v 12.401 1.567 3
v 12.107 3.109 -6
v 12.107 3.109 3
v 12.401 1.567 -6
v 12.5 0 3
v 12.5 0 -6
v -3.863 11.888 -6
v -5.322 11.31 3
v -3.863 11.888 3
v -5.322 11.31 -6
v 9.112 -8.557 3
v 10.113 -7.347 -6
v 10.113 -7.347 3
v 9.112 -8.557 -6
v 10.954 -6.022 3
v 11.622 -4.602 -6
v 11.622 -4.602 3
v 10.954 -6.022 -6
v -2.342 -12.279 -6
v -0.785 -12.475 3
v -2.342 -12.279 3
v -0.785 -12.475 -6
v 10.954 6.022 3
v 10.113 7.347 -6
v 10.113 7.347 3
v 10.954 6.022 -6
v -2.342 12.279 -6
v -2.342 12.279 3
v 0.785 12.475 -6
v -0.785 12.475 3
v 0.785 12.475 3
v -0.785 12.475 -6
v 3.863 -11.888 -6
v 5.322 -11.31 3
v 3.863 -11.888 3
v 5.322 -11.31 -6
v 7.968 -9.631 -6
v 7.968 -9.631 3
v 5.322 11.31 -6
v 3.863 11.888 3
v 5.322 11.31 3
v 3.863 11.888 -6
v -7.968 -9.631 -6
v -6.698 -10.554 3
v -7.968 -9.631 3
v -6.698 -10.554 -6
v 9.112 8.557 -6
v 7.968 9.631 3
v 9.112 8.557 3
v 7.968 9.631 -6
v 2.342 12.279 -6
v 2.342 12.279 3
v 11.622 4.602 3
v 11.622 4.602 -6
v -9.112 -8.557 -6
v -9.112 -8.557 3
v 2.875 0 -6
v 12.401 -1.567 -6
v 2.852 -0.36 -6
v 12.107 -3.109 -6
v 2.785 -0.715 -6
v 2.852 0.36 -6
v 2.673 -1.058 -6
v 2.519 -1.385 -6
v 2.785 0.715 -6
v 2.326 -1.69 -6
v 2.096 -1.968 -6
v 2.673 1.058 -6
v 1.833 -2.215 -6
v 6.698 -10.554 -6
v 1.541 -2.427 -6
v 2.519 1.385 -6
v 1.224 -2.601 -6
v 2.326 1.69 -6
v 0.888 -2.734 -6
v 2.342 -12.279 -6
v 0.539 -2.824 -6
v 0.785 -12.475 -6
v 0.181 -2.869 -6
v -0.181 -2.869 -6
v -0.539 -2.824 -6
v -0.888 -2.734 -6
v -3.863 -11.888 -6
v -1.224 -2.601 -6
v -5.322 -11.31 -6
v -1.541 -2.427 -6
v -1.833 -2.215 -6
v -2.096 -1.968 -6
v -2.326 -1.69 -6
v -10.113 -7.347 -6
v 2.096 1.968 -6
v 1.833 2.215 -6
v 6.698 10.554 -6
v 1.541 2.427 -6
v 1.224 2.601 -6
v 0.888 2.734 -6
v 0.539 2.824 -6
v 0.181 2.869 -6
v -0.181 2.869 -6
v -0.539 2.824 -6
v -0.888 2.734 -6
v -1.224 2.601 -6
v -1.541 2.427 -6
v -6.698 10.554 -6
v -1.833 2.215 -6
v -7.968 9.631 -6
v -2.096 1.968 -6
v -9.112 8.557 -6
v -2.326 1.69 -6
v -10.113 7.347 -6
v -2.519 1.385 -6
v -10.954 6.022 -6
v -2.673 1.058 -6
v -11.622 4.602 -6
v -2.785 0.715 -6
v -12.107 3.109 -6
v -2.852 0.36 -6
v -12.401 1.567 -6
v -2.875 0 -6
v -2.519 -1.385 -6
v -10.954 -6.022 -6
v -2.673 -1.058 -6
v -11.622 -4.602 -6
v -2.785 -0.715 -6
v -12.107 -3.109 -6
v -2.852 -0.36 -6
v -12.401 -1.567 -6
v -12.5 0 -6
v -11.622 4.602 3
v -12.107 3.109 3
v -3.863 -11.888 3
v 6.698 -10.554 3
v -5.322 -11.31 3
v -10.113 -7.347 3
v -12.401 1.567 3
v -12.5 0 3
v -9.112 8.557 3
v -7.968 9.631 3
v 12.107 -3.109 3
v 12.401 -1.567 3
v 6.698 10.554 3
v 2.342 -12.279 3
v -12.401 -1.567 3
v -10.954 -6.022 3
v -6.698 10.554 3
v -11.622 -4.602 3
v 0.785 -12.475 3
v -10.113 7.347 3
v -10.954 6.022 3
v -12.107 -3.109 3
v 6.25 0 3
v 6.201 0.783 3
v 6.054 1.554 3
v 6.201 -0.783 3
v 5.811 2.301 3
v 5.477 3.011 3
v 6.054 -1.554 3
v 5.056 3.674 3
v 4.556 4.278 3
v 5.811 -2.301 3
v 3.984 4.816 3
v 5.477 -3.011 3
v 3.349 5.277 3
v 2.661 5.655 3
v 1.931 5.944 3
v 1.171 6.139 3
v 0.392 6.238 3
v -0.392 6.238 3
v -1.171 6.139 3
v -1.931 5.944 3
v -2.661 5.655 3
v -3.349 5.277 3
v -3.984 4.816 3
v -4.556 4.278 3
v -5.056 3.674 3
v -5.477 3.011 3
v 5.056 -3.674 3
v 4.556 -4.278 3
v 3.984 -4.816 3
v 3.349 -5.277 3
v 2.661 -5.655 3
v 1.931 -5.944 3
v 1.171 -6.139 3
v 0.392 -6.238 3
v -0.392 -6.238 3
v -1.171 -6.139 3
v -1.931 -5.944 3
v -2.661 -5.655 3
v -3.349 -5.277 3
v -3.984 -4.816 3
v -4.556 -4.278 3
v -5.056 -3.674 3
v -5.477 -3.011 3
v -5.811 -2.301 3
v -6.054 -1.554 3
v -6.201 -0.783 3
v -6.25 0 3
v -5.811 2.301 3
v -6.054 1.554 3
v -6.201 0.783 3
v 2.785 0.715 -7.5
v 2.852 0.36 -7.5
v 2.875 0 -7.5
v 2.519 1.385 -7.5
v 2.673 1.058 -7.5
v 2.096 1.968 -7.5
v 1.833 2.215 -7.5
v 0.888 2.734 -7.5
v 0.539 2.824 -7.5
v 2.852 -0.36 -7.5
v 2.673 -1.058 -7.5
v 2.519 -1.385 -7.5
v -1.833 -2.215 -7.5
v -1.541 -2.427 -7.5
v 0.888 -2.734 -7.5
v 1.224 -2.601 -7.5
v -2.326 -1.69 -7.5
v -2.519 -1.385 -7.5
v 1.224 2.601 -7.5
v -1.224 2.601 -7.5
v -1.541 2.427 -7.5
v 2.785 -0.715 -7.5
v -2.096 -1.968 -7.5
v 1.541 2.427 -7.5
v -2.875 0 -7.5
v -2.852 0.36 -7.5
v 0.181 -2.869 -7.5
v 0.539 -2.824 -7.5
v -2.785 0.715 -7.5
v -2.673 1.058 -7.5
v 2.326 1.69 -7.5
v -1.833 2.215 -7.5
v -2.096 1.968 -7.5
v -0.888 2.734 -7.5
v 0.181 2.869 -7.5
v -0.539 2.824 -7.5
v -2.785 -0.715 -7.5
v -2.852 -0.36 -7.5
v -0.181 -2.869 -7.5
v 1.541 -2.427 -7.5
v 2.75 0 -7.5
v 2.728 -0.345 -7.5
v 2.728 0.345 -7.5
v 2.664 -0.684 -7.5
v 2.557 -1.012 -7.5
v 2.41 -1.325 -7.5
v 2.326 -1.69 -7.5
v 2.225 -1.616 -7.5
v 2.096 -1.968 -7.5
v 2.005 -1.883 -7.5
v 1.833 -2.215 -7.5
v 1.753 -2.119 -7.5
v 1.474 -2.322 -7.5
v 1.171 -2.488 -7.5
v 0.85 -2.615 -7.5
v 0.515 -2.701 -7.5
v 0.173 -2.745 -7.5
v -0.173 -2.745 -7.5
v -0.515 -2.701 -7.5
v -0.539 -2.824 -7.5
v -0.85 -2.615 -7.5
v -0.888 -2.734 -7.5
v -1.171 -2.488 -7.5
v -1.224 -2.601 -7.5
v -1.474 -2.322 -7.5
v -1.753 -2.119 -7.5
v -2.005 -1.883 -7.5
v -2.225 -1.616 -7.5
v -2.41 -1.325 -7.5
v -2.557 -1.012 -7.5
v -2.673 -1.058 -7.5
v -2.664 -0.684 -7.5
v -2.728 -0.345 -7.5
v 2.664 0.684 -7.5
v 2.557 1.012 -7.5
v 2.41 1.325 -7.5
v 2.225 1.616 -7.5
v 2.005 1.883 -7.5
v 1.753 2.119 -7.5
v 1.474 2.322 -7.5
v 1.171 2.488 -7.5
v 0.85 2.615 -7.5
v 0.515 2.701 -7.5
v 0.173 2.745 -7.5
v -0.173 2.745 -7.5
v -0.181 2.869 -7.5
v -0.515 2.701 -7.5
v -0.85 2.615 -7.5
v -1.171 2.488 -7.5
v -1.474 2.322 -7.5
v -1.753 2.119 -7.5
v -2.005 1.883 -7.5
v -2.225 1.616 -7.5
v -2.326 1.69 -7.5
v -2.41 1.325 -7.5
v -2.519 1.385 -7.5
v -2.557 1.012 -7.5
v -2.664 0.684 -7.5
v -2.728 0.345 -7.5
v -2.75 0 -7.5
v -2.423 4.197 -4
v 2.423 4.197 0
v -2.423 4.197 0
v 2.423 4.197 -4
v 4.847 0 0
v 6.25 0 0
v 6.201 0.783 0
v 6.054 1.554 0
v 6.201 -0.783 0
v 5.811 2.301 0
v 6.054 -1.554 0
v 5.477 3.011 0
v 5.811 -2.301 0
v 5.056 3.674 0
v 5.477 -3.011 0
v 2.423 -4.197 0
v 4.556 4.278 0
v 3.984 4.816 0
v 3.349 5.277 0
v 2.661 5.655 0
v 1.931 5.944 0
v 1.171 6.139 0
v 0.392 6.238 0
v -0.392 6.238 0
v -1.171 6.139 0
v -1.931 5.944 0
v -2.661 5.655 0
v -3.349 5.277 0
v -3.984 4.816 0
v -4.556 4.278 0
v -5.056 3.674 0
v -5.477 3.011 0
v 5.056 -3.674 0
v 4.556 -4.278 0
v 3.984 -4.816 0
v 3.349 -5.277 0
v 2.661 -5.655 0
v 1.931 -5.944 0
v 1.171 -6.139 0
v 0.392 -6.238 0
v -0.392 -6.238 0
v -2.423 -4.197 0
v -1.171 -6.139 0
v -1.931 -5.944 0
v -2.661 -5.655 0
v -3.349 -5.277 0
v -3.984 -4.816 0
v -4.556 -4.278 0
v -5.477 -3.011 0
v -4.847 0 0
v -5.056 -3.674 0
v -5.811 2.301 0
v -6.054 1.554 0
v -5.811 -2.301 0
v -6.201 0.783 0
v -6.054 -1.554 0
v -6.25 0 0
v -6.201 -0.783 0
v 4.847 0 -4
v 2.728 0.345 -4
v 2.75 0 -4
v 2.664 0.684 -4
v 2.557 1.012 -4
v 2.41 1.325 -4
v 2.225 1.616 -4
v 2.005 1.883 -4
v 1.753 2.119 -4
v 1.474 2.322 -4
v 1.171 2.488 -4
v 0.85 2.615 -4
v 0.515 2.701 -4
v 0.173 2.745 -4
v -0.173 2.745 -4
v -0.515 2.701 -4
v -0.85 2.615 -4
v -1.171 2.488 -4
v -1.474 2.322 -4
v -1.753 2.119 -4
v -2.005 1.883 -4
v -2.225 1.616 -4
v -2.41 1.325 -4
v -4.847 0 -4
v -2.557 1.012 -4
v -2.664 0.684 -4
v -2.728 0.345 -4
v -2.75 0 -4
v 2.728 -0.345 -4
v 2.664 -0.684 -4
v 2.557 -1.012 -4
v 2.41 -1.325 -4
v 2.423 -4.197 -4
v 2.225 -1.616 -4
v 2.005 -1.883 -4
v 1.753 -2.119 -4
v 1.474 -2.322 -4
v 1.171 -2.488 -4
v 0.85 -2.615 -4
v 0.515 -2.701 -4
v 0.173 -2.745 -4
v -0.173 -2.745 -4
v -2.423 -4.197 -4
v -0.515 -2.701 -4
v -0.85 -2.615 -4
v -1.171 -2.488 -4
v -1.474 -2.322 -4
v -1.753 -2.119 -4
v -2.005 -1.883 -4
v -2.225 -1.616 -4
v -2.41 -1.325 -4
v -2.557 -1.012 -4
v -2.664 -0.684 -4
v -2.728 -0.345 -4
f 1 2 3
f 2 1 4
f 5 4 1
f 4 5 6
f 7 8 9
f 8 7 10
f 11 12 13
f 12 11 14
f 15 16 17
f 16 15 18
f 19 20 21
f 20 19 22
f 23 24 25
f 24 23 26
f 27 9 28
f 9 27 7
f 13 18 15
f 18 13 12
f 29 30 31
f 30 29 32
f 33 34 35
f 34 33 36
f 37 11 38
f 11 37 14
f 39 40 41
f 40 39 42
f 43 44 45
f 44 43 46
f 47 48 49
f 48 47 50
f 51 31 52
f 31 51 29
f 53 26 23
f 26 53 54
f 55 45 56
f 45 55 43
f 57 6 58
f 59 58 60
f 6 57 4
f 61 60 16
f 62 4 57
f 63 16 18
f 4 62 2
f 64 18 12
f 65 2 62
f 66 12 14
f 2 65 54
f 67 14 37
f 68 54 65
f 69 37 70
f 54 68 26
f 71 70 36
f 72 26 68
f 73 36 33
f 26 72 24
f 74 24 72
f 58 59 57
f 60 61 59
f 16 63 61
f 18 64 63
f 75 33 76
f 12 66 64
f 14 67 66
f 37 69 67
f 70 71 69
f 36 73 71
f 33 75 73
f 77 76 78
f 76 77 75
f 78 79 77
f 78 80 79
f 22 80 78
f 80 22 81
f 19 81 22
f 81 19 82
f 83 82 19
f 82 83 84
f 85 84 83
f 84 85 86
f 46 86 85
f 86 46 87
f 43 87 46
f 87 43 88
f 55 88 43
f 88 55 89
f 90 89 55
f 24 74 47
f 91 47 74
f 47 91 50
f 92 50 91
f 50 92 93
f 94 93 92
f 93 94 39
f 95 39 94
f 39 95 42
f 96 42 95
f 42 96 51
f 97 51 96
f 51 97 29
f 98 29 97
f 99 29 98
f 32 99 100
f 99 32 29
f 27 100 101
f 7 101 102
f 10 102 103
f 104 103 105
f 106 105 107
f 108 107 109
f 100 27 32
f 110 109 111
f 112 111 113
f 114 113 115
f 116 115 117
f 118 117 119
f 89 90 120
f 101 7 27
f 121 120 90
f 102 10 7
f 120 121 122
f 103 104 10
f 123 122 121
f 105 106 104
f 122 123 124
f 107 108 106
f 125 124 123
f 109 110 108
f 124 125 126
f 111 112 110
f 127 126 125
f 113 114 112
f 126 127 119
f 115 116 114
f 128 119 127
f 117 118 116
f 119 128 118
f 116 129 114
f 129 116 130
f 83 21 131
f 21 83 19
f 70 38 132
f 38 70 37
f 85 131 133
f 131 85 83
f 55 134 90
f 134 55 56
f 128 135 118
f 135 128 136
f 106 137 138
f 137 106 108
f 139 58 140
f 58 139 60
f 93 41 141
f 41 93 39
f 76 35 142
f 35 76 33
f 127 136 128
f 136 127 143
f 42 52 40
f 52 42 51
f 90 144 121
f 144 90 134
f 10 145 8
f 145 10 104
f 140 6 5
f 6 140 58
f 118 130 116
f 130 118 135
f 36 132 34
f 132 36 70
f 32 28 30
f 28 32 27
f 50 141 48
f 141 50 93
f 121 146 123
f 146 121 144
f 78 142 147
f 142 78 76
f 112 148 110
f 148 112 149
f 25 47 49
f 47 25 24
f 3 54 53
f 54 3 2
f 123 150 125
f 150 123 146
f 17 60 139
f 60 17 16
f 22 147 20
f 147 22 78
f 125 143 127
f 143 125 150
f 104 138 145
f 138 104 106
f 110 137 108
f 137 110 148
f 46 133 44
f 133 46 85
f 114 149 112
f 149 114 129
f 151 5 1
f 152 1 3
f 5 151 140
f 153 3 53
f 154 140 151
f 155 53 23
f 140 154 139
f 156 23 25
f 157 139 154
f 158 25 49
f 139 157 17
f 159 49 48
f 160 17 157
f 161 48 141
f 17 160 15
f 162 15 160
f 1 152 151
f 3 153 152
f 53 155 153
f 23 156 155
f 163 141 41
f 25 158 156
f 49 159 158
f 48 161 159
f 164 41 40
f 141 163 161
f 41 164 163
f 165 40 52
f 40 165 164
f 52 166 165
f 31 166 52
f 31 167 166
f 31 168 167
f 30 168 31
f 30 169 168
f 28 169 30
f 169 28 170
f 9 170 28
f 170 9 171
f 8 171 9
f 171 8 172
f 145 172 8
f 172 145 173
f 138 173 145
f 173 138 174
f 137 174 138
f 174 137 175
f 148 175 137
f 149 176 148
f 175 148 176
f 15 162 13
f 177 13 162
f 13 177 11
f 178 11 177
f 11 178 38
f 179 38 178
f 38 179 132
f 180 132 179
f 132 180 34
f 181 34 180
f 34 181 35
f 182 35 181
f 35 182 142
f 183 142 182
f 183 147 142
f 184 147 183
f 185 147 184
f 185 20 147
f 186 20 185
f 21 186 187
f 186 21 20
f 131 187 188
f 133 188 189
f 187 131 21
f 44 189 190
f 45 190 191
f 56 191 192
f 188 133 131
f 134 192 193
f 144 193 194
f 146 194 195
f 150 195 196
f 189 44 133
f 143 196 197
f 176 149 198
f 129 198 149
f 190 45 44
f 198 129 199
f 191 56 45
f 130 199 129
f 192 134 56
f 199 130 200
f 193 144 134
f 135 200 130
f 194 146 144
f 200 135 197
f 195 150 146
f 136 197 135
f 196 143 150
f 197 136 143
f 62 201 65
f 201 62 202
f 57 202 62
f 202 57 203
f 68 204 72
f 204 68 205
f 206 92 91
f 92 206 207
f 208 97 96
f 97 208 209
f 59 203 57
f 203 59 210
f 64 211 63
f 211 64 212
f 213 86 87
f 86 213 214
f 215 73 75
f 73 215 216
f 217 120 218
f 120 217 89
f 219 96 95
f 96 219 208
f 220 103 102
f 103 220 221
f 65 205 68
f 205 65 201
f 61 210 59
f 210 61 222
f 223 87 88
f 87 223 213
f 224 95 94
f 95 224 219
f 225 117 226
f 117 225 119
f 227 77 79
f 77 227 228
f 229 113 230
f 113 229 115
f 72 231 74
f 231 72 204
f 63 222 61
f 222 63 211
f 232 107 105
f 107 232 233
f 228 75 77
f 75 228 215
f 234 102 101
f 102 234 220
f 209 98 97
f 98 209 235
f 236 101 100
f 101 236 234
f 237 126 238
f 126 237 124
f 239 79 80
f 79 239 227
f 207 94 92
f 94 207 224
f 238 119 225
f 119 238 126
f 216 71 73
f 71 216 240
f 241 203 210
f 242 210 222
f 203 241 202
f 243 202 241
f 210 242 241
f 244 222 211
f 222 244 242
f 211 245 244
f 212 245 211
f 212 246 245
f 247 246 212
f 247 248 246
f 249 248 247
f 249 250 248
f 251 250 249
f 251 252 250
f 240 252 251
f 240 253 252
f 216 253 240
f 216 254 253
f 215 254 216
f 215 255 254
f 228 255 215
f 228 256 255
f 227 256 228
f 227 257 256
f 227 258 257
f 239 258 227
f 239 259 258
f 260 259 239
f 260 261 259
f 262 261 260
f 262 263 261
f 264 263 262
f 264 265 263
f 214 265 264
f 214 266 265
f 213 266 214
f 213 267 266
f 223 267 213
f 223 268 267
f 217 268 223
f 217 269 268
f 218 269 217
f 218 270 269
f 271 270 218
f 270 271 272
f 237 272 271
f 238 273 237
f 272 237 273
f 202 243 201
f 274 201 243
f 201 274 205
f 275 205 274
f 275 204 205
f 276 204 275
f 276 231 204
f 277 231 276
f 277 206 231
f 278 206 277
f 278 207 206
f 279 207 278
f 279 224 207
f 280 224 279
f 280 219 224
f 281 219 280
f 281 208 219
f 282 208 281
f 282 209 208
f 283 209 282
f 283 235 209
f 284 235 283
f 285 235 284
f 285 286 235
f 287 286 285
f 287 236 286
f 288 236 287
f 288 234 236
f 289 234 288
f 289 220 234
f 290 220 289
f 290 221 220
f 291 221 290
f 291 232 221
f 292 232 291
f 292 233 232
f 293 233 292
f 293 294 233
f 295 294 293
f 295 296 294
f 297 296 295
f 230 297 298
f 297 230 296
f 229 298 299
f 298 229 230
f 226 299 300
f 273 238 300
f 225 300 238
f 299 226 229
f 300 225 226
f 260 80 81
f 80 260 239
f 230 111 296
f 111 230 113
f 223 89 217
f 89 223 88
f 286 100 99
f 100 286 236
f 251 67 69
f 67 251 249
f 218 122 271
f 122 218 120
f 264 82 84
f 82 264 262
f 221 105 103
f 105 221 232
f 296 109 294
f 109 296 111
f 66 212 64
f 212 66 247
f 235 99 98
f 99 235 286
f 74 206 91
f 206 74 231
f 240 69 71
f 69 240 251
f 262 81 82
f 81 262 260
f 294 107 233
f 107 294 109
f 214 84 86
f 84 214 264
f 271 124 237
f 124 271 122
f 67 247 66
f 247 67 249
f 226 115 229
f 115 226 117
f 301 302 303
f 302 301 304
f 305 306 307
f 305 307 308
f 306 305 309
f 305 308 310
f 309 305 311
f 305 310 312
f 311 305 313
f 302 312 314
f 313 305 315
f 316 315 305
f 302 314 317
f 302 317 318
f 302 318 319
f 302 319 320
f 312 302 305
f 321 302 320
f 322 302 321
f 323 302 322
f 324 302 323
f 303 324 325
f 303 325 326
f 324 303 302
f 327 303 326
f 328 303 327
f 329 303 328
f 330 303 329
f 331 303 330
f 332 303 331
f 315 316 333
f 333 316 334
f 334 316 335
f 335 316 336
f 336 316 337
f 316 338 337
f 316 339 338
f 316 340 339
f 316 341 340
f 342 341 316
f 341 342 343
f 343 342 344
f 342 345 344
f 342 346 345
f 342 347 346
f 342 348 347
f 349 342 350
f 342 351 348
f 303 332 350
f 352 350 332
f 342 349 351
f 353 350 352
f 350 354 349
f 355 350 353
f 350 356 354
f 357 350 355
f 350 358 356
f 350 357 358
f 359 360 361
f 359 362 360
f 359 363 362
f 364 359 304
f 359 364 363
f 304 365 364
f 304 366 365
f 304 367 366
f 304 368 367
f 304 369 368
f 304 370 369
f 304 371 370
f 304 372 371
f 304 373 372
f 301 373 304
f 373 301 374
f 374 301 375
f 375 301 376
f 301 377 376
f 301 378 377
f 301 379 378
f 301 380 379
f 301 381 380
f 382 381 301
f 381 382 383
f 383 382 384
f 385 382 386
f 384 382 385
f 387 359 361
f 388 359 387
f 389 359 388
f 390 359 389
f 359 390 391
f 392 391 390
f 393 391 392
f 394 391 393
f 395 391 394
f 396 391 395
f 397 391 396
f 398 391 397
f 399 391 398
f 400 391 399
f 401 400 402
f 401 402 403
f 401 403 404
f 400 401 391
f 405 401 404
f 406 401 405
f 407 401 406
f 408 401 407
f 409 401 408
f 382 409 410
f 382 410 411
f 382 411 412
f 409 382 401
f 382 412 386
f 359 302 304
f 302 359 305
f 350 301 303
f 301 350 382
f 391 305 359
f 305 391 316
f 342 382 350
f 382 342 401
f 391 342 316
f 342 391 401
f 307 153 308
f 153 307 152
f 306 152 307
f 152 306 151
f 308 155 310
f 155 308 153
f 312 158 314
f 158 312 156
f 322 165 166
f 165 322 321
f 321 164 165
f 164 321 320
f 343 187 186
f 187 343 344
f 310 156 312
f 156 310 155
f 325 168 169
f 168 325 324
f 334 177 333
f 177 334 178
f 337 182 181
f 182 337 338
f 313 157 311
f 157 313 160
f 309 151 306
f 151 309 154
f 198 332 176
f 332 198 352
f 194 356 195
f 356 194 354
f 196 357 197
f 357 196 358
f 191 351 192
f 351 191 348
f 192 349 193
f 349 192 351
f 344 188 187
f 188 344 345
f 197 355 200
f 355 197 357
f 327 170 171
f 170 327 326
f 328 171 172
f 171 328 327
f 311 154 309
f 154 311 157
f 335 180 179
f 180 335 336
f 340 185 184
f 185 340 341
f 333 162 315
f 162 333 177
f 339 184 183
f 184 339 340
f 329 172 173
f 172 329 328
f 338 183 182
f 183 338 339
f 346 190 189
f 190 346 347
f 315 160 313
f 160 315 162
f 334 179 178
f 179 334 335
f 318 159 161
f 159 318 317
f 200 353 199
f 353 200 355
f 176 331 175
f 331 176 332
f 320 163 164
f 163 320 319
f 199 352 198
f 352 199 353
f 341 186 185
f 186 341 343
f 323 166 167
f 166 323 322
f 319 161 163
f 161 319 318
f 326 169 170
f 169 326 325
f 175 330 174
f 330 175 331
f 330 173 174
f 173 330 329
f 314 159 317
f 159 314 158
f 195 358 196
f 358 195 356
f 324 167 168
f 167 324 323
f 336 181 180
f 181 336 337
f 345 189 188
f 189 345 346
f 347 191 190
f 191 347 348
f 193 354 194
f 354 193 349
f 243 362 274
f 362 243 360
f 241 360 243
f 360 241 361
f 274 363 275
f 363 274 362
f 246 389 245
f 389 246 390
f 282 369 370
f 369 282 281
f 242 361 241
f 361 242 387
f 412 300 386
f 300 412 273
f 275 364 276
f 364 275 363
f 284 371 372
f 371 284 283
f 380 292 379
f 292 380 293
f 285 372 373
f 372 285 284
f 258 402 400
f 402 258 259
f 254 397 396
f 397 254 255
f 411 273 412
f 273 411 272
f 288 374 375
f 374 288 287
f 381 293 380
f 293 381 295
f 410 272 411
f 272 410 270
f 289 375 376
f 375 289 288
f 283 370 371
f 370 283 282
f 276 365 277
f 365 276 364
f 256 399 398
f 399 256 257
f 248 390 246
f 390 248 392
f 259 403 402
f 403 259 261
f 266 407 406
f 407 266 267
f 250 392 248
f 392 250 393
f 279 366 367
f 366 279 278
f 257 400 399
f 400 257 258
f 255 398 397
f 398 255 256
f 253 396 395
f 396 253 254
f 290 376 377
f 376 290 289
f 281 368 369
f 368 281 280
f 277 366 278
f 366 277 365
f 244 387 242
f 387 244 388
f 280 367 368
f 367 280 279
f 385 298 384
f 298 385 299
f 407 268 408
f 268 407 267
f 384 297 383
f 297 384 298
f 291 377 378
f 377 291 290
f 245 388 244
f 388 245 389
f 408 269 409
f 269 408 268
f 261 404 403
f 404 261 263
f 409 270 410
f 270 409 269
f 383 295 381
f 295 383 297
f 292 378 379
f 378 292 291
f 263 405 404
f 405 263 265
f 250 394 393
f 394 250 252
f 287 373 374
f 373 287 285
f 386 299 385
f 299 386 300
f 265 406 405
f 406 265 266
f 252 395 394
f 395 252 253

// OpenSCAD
$fn = 50;

difference() {
	union() {
		translate(v = [0, 0, -6.0]) {
			cylinder(h = 9.0, r = 12.5);
		}
		#translate(v = [0, 0, -7.5]) {
			cylinder(h = 7.5, r = 2.875);
		}
	}
	union() {
		translate(v = [0, 0, 0]) {
			rotate(a = [0, 0, 0]) {
				difference() {
					union() {
						translate(v = [0, 0, -4]) {
							linear_extrude(height = 4) {
								polygon(points = [[4.8468, 0.0], [2.4234000000000004, 4.197451927062417], [-2.423399999999999, 4.197451927062417], [-4.8468, 5.935618106107392e-16], [-2.423400000000002, -4.197451927062416], [2.423399999999997, -4.197451927062419]]);
							}
						}
					}
					union();
				}
			}
		}
		#cylinder(h = 3, r = 6.25);
		#translate(v = [0, 0, -100.0]) {
			cylinder(h = 200, r = 2.75);
		}
	}
}
